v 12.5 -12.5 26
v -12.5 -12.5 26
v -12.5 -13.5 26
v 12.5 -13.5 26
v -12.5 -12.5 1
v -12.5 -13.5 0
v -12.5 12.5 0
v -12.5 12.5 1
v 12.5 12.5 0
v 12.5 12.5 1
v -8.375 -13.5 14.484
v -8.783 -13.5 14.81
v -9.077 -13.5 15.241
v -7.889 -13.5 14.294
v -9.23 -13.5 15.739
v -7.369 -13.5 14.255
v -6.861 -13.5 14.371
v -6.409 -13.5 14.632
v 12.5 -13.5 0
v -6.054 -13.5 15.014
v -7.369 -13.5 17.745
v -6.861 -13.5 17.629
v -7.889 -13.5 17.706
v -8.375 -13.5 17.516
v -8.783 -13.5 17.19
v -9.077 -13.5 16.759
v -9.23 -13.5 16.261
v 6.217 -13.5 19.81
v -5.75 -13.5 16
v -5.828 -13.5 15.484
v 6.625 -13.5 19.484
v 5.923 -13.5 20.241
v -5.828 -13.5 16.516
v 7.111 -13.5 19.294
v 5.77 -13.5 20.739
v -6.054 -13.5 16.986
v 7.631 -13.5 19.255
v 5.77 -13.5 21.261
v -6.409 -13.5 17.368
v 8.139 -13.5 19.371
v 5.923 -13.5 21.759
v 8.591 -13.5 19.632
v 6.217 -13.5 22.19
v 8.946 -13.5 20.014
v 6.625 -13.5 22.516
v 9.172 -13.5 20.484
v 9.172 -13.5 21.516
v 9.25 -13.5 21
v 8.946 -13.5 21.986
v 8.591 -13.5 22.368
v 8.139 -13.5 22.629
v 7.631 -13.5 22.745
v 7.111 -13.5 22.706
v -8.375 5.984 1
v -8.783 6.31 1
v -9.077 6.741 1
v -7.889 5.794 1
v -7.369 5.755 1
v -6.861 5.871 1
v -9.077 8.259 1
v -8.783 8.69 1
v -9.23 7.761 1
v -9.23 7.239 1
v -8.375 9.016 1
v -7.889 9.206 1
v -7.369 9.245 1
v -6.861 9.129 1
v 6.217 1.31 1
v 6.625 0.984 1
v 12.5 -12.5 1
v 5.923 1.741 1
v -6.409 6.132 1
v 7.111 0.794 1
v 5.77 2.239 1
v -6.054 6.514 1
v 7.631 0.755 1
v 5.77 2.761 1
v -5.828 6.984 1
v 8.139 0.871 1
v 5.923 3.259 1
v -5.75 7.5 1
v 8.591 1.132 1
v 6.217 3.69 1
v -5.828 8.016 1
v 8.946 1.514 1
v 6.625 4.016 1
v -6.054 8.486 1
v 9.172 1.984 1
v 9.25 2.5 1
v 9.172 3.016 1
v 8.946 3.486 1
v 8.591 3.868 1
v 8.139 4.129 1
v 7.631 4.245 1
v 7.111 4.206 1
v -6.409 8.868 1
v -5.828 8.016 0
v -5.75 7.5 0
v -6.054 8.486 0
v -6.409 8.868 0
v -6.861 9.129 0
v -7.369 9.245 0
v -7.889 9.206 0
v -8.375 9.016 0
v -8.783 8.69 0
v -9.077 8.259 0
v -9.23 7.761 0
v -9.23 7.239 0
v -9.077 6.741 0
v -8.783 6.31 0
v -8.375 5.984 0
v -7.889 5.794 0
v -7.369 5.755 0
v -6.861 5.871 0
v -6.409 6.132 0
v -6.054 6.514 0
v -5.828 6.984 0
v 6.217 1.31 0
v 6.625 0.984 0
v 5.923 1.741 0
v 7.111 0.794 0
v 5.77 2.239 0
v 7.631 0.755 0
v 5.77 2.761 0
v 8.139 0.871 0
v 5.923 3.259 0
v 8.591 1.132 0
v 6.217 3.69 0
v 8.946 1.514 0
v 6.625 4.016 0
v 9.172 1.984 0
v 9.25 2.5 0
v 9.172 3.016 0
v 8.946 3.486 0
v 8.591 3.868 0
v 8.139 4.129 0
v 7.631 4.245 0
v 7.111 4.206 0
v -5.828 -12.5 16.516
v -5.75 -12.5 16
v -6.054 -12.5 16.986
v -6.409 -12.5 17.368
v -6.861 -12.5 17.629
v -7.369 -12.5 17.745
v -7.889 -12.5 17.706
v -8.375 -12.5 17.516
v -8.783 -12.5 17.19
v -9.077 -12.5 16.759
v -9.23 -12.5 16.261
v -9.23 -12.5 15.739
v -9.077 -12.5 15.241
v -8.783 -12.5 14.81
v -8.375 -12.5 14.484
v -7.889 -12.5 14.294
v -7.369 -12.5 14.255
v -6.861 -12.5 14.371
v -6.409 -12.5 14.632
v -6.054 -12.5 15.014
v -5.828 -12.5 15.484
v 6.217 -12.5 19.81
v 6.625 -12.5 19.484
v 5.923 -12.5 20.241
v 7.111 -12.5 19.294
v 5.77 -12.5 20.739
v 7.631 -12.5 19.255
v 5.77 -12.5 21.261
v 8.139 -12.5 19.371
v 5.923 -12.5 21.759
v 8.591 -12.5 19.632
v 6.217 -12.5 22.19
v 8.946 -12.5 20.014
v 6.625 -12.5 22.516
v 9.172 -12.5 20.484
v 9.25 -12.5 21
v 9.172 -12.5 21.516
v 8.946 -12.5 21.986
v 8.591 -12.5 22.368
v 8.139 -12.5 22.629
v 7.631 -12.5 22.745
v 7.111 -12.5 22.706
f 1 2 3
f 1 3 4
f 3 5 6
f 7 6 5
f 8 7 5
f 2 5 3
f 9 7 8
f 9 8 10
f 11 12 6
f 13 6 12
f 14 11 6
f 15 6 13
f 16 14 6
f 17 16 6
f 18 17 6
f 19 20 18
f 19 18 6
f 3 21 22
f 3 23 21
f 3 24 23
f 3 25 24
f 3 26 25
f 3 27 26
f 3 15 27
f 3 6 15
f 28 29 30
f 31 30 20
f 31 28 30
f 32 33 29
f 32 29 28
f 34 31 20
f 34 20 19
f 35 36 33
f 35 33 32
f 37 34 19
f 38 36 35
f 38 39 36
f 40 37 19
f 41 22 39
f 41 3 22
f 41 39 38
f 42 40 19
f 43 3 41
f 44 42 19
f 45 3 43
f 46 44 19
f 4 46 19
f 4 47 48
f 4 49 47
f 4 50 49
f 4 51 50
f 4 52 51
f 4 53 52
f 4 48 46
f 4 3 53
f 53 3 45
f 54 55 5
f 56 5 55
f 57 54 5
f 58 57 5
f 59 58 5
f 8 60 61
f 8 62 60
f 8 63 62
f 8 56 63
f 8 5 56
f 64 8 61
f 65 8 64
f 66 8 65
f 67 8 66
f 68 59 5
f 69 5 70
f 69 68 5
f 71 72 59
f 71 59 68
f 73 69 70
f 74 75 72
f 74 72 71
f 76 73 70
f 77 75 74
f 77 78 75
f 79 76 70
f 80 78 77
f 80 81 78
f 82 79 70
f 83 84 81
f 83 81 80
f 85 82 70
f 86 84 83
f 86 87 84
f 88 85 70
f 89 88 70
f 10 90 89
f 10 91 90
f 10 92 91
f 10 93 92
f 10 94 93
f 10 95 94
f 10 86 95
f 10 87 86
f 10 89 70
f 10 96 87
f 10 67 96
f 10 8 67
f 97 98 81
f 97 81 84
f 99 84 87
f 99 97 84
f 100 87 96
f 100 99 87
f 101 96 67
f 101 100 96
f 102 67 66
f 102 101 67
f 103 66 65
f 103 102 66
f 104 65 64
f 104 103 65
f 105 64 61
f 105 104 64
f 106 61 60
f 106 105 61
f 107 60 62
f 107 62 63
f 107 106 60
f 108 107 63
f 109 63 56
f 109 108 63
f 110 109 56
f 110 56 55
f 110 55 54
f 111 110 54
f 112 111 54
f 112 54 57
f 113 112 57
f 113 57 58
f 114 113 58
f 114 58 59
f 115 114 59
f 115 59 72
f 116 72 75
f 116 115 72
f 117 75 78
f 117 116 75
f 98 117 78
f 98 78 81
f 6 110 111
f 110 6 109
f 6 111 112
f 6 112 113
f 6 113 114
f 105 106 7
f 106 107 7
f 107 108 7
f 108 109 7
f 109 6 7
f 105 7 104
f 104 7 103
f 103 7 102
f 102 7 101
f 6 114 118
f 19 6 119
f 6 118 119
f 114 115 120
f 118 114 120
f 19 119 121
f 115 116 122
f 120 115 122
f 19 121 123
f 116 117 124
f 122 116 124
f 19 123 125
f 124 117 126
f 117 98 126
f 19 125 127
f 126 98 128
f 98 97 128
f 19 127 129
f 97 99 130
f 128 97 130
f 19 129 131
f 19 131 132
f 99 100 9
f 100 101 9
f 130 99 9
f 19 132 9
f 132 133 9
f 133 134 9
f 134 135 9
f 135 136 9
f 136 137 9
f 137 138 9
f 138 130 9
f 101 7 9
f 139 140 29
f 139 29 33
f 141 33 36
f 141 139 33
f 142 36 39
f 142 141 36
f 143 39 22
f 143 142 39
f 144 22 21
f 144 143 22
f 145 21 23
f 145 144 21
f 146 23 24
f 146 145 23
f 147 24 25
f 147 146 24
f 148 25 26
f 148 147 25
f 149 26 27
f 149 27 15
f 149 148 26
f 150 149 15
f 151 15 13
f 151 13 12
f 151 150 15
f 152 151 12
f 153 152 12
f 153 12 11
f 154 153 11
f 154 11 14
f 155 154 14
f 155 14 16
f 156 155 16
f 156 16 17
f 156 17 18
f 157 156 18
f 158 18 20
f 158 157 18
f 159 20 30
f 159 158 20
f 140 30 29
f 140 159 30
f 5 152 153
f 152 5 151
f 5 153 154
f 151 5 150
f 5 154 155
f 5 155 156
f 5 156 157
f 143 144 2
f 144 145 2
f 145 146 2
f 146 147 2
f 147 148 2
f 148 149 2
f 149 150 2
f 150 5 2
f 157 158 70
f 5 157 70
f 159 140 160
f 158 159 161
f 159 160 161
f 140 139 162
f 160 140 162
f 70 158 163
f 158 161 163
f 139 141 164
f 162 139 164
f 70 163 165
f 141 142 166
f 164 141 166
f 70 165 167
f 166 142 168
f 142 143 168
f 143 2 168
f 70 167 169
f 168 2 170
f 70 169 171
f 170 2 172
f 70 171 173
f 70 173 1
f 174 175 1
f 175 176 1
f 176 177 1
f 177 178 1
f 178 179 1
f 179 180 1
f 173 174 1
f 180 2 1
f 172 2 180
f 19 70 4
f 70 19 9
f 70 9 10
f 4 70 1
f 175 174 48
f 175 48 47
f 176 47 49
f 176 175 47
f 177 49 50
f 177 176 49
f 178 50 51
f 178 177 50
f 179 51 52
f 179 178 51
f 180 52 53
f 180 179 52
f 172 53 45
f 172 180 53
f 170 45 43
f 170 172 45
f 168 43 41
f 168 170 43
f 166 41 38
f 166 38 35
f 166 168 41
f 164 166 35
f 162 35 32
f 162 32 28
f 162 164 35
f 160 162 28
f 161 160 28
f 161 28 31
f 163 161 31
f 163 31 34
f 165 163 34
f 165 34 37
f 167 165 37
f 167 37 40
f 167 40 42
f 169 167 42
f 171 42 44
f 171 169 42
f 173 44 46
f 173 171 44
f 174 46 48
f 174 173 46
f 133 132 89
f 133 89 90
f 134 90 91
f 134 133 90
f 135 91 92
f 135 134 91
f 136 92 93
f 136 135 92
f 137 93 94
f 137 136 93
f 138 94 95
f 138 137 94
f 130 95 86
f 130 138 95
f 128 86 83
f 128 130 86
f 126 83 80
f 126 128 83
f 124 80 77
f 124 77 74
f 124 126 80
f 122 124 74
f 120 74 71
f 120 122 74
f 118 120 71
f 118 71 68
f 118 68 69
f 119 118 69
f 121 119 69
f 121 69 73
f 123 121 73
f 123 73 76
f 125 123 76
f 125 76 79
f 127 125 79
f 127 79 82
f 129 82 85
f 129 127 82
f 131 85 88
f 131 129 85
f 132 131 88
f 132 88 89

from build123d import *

# Parameters (mm, degrees)
SKETCH1_W           = 25
SKETCH1_H           = 25
SKETCH1_R           = 1.75
BOSS_EXTRUDE2_DEPTH = 1
SKETCH4_W           = 25
SKETCH4_H           = 26
SKETCH4_R           = 1.75
BOSS_EXTRUDE3_DEPTH = 1


with BuildPart() as part:
    # Sketch1 → Boss-Extrude2 (new body)
    with BuildSketch(Plane.XY):
        Rectangle(SKETCH1_W, SKETCH1_H)
        with Locations((7.5, 2.5)):
            Circle(SKETCH1_R, mode=Mode.SUBTRACT)
        with Locations((-7.5, 7.5)):
            Circle(SKETCH1_R, mode=Mode.SUBTRACT)
    extrude(amount=BOSS_EXTRUDE2_DEPTH)

    # Sketch4 → Boss-Extrude3 (add)
    with BuildSketch(Plane.XZ.offset(12.5)):
        with Locations((0, 13)):
            Rectangle(SKETCH4_W, SKETCH4_H)
        with Locations((7.5, 21)):
            Circle(SKETCH4_R, mode=Mode.SUBTRACT)
        with Locations((-7.5, 16)):
            Circle(SKETCH4_R, mode=Mode.SUBTRACT)
    extrude(amount=BOSS_EXTRUDE3_DEPTH)


solid = part.part
